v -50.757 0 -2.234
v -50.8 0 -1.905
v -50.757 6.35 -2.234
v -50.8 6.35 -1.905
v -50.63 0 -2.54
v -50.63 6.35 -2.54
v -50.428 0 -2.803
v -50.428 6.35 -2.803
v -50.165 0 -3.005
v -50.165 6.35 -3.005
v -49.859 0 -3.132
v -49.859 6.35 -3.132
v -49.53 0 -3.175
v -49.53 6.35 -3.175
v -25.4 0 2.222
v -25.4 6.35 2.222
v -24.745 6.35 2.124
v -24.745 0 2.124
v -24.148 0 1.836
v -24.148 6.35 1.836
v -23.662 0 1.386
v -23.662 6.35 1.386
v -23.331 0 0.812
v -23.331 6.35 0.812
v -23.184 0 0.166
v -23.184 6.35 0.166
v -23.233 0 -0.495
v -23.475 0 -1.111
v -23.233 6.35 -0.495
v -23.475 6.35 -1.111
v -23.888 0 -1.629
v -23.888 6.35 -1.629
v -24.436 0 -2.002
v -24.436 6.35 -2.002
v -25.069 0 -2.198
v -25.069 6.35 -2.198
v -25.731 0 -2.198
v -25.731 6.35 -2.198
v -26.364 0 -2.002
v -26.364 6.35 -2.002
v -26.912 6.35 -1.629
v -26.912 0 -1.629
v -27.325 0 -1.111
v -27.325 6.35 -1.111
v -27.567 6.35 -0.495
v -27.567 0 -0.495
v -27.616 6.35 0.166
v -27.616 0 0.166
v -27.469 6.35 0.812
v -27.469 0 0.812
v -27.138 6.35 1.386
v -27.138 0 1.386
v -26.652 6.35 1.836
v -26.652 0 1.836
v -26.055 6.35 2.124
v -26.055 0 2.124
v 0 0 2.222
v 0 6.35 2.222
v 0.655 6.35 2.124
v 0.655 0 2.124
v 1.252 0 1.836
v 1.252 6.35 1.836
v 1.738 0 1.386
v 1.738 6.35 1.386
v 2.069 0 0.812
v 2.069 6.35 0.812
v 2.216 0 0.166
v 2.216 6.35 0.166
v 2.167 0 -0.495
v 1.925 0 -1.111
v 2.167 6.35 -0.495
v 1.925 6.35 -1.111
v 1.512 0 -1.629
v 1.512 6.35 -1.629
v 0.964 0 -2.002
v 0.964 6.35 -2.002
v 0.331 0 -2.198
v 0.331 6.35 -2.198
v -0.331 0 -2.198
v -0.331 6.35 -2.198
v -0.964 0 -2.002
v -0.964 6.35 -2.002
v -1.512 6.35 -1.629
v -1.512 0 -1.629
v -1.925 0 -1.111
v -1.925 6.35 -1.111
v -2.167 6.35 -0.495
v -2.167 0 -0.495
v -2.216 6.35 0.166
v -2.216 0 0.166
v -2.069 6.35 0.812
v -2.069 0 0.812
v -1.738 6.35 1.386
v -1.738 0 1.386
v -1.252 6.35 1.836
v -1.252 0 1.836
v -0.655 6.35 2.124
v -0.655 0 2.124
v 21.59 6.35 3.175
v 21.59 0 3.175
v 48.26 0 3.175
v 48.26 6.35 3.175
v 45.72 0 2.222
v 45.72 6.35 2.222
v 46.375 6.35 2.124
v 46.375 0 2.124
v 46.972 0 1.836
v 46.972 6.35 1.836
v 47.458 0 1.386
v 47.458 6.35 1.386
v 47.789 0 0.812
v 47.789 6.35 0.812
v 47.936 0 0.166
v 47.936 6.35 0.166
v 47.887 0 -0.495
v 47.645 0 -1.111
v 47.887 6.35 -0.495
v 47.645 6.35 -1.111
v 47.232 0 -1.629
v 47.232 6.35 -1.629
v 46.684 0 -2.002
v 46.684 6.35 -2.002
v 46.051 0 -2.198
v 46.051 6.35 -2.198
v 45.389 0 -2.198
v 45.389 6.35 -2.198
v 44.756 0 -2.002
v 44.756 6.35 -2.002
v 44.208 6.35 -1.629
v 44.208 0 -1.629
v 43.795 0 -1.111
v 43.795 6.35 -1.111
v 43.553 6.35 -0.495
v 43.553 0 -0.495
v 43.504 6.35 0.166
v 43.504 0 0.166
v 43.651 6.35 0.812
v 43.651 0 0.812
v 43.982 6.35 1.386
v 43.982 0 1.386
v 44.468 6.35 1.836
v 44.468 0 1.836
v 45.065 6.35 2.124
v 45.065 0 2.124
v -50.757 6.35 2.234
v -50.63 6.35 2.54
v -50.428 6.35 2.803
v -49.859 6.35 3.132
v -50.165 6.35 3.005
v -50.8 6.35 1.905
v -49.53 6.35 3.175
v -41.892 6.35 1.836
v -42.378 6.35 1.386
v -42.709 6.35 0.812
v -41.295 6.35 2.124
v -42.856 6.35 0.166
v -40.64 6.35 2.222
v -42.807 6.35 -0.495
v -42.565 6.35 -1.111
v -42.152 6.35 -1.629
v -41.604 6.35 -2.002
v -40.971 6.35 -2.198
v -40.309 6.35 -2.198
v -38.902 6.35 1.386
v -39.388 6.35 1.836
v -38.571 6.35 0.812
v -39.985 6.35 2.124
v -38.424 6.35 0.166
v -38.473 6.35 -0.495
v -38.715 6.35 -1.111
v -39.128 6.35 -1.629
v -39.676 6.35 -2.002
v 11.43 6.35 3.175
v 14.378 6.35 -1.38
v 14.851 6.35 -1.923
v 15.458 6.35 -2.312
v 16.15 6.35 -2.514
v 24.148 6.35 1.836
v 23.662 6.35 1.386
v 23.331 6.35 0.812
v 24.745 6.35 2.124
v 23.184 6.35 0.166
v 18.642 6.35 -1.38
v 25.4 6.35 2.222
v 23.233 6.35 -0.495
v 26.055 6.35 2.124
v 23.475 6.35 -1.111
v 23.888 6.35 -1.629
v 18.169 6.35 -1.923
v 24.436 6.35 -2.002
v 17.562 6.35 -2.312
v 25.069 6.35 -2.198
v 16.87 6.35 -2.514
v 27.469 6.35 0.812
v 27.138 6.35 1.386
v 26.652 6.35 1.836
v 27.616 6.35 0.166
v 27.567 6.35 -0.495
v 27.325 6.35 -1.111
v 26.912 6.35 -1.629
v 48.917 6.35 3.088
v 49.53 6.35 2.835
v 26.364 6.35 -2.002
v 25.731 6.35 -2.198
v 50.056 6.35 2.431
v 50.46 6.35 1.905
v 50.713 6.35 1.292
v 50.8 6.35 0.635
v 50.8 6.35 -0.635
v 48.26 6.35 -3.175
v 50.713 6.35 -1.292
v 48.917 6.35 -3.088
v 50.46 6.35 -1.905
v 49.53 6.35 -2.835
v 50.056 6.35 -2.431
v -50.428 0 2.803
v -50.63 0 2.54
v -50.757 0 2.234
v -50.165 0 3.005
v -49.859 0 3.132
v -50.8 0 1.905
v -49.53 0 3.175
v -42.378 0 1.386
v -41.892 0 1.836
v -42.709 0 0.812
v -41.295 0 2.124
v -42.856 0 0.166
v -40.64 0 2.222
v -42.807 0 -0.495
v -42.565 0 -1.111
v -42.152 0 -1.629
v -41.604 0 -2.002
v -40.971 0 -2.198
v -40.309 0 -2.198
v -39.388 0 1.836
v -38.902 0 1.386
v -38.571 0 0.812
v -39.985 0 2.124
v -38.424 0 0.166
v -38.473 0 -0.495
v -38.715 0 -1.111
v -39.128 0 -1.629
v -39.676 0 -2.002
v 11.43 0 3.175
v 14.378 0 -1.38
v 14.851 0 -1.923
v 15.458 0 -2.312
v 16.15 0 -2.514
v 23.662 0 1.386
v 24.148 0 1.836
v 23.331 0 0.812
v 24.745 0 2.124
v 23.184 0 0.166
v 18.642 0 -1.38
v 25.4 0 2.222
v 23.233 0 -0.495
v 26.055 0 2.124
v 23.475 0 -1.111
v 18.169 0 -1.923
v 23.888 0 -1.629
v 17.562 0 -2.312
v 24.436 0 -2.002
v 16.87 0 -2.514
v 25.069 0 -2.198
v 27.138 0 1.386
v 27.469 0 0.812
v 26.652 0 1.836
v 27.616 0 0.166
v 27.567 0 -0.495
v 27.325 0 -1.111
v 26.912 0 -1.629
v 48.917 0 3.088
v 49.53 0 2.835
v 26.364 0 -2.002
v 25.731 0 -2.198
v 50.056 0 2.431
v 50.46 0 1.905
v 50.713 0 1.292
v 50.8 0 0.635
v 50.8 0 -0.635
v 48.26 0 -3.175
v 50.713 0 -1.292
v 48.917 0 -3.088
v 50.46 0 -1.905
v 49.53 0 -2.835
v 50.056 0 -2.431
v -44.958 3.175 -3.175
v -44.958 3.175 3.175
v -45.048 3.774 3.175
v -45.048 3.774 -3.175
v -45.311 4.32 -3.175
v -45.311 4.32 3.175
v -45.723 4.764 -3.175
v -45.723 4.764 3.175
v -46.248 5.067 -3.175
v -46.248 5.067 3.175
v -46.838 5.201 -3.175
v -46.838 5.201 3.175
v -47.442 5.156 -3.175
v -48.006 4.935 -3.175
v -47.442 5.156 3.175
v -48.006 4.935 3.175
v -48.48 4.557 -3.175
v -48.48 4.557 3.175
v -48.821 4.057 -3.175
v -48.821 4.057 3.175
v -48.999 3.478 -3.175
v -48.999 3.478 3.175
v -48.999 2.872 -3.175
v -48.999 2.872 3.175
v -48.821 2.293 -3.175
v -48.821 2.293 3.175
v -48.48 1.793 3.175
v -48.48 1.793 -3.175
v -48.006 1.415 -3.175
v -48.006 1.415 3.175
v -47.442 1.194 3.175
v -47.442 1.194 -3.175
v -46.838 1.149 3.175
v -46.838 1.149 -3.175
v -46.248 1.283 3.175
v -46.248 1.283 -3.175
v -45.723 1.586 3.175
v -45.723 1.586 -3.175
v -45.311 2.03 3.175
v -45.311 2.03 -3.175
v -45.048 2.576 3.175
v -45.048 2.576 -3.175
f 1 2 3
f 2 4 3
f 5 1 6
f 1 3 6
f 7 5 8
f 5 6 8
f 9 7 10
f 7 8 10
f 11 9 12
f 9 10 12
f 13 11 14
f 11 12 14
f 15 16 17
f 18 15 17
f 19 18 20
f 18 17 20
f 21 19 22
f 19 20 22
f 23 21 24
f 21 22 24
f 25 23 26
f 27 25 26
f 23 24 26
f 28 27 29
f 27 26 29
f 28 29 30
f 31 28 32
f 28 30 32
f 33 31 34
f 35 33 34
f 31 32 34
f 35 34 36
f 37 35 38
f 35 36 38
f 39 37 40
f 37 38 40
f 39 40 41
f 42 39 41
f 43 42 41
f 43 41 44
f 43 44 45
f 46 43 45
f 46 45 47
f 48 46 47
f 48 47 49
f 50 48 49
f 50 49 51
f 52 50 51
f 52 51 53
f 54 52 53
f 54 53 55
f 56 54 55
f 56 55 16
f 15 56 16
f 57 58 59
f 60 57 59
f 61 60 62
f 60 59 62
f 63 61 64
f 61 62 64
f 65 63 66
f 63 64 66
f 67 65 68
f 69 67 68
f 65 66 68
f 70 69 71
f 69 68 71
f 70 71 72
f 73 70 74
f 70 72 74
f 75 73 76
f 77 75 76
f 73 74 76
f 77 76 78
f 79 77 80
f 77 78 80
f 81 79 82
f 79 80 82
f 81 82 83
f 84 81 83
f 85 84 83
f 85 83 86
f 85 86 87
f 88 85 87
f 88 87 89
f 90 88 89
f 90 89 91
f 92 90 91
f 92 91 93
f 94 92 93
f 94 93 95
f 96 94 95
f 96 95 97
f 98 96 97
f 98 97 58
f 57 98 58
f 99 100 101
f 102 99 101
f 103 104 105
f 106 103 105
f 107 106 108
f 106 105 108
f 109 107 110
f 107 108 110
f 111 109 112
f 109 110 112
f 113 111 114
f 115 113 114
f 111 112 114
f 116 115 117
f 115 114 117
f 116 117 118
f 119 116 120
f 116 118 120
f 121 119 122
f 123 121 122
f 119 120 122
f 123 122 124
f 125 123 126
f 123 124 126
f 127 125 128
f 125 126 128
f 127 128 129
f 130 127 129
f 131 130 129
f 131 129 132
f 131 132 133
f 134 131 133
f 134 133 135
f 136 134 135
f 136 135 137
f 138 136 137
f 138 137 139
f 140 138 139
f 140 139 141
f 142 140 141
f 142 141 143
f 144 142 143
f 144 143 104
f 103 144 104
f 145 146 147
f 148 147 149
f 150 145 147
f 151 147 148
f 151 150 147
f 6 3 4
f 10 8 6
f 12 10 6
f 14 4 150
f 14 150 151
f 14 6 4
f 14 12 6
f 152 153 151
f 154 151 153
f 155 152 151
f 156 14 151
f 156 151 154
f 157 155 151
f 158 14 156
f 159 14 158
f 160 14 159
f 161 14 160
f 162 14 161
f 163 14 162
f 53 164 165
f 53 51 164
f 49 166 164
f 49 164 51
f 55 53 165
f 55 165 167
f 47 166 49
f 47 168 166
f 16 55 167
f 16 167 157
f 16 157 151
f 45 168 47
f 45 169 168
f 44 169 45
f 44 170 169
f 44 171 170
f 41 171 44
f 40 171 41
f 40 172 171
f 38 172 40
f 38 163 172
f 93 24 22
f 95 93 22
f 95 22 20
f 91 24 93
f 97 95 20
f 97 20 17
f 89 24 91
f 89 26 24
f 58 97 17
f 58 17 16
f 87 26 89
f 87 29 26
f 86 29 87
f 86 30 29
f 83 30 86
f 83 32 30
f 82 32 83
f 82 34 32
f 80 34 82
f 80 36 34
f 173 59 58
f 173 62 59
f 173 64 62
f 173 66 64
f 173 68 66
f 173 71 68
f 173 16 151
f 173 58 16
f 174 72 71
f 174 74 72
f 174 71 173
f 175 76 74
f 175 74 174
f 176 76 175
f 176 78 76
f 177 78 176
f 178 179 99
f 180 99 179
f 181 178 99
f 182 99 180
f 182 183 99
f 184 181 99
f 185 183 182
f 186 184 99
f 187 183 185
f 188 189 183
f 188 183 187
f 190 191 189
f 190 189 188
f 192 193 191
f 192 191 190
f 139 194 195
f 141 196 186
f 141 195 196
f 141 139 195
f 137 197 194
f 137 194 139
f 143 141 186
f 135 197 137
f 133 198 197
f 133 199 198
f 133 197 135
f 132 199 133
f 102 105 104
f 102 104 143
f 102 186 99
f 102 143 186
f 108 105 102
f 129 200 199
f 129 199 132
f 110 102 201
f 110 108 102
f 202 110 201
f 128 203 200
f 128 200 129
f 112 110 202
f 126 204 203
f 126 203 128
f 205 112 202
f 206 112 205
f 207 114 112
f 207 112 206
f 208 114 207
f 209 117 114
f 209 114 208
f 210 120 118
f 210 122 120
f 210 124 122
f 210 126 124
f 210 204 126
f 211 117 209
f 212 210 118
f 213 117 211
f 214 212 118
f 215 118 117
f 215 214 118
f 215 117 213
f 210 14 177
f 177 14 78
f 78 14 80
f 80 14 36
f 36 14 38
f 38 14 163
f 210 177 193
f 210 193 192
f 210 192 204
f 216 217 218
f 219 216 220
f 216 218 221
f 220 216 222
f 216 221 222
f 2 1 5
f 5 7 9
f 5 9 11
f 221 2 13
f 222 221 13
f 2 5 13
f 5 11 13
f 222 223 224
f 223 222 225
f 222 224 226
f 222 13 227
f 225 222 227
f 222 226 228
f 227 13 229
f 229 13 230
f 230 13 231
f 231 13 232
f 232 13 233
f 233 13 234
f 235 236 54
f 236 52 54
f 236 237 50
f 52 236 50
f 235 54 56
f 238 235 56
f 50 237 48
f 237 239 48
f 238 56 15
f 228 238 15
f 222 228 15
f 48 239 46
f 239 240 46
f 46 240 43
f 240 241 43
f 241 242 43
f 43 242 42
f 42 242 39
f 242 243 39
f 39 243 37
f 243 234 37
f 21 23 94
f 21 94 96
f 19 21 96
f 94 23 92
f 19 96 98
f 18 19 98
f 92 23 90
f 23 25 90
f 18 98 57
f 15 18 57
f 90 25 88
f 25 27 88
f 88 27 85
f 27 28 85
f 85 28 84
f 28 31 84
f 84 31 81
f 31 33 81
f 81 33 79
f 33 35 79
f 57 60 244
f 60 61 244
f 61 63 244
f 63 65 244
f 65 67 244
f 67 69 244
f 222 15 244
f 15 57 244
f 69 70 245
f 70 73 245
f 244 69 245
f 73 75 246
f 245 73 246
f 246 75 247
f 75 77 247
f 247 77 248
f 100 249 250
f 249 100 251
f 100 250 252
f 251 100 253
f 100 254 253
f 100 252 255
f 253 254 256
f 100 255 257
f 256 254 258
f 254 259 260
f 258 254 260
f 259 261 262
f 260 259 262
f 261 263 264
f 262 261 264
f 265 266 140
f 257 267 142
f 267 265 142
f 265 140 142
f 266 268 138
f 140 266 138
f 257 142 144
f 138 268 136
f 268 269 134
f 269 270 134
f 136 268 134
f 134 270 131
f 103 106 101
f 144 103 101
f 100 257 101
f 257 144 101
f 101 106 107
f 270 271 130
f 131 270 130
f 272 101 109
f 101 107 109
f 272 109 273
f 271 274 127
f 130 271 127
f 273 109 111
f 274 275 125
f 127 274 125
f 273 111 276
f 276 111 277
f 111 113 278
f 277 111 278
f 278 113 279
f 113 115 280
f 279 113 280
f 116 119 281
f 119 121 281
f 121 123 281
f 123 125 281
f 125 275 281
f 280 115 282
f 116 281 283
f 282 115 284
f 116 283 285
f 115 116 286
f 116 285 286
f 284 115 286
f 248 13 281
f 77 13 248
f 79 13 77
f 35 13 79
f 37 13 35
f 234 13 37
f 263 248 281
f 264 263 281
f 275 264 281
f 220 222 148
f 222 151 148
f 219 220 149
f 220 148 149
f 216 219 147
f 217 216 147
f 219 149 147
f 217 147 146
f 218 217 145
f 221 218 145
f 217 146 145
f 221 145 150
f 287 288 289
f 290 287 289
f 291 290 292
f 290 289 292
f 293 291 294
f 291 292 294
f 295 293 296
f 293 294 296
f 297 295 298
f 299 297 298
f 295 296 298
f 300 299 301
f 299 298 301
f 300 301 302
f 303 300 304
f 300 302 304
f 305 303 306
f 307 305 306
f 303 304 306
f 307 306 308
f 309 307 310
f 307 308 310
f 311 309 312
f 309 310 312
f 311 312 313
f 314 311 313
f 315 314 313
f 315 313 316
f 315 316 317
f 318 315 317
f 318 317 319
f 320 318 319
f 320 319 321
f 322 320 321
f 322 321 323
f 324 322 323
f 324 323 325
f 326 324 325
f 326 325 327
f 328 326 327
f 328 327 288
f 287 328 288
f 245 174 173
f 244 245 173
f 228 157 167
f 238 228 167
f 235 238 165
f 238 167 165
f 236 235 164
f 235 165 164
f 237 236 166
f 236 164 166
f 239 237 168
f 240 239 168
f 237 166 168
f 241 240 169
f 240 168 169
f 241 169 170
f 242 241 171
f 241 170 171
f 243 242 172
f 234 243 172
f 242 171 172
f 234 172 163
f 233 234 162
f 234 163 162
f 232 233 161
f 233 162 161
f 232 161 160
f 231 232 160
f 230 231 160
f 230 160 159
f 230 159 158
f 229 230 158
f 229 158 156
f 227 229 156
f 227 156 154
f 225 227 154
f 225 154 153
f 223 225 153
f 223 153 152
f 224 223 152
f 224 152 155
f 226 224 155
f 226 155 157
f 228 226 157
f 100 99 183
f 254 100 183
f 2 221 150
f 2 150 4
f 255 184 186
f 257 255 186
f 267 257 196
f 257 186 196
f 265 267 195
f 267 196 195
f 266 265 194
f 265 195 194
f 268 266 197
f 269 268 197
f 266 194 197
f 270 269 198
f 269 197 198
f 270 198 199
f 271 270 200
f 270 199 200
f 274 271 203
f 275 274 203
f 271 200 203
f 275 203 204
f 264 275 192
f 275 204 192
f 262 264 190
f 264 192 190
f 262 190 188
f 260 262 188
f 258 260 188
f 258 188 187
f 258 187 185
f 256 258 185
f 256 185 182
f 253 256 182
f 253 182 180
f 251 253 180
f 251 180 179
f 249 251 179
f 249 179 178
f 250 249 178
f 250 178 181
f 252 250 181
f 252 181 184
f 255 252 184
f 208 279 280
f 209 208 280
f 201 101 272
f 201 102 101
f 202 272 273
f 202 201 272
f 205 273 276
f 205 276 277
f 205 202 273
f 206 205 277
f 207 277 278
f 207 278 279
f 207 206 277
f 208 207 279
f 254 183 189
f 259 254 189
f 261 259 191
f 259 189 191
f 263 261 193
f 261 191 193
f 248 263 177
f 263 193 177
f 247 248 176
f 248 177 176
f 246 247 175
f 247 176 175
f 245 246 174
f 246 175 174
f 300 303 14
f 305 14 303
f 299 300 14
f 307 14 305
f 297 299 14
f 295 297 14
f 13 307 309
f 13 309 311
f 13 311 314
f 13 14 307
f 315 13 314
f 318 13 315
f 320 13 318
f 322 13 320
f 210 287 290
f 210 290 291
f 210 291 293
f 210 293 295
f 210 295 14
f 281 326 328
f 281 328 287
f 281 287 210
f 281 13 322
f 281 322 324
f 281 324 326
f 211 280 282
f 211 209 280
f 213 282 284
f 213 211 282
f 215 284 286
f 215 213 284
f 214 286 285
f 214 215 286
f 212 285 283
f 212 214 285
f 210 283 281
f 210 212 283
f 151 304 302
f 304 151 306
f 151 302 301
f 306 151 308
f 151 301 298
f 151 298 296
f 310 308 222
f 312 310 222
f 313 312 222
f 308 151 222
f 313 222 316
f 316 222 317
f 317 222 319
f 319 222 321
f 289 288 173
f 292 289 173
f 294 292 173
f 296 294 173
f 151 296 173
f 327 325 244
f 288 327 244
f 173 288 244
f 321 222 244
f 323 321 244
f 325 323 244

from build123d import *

# Parameters (mm, degrees)
SKETCH1_W           = 101.6
SKETCH1_H           = 6.35
BOSS_EXTRUDE1_DEPTH = 6.35
FILLET1_R           = 2.54
FILLET2_R           = 1.27
CUT_EXTRUDE1_REACH  = 53.294
SKETCH2_R           = 2.2225
CUT_EXTRUDE2_REACH  = 53.588
SKETCH3_R           = 2.032
CUT_EXTRUDE3_REACH  = 53.294


with BuildPart() as part:
    # Sketch1 → Boss-Extrude1 (new body)
    with BuildSketch(Plane(origin=(0, 0, 0), x_dir=(1, 0, 0), z_dir=(0, 1, 0))):
        Rectangle(SKETCH1_W, SKETCH1_H)
    extrude(amount=BOSS_EXTRUDE1_DEPTH)

    # Fillet1
    fillet1_edges = [part.edges().sort_by_distance(p)[0] for p in [
        (50.8, 3.175, 3.175),
        (50.8, 3.175, -3.175),
    ]]
    fillet(fillet1_edges, radius=FILLET1_R)

    # Fillet2
    fillet2_edges = [part.edges().sort_by_distance(p)[0] for p in [
        (-50.8, 3.175, 3.175),
        (-50.8, 3.175, -3.175),
    ]]
    fillet(fillet2_edges, radius=FILLET2_R)

    # Sketch2 → Cut-Extrude1 (cut, up to next)
    with BuildSketch(Plane(origin=(0, 6.35, 0), x_dir=(1, 0, 0), z_dir=(0, 1, 0)), mode=Mode.PRIVATE) as cut_extrude1_sk1:
        with Locations(Location((-40.64, 0, 0), (0, 0, 270))):
            Circle(SKETCH2_R)
    cut_extrude1_tool1 = extrude(cut_extrude1_sk1.sketch, amount=-CUT_EXTRUDE1_REACH, mode=Mode.PRIVATE) & part.part
    # Sketch2 → Cut-Extrude1 (cut, up to next)
    with BuildSketch(Plane(origin=(0, 6.35, 0), x_dir=(1, 0, 0), z_dir=(0, 1, 0)), mode=Mode.PRIVATE) as cut_extrude1_sk2:
        with Locations(Location((45.72, 0, 0), (0, 0, 270))):
            Circle(SKETCH2_R)
    cut_extrude1_tool2 = extrude(cut_extrude1_sk2.sketch, amount=-CUT_EXTRUDE1_REACH, mode=Mode.PRIVATE) & part.part
    # Sketch2 → Cut-Extrude1 (cut, up to next)
    with BuildSketch(Plane(origin=(0, 6.35, 0), x_dir=(1, 0, 0), z_dir=(0, 1, 0)), mode=Mode.PRIVATE) as cut_extrude1_sk3:
        with Locations(Location((25.4, 0, 0), (0, 0, 270))):
            Circle(SKETCH2_R)
    cut_extrude1_tool3 = extrude(cut_extrude1_sk3.sketch, amount=-CUT_EXTRUDE1_REACH, mode=Mode.PRIVATE) & part.part
    # Sketch2 → Cut-Extrude1 (cut, up to next)
    with BuildSketch(Plane(origin=(0, 6.35, 0), x_dir=(1, 0, 0), z_dir=(0, 1, 0)), mode=Mode.PRIVATE) as cut_extrude1_sk4:
        with Locations(Location((-25.4, 0, 0), (0, 0, 270))):
            Circle(SKETCH2_R)
    cut_extrude1_tool4 = extrude(cut_extrude1_sk4.sketch, amount=-CUT_EXTRUDE1_REACH, mode=Mode.PRIVATE) & part.part
    # Sketch2 → Cut-Extrude1 (cut, up to next)
    with BuildSketch(Plane(origin=(0, 6.35, 0), x_dir=(1, 0, 0), z_dir=(0, 1, 0)), mode=Mode.PRIVATE) as cut_extrude1_sk5:
        with Locations(Location((0, 0, 0), (0, 0, 270))):
            Circle(SKETCH2_R)
    cut_extrude1_tool5 = extrude(cut_extrude1_sk5.sketch, amount=-CUT_EXTRUDE1_REACH, mode=Mode.PRIVATE) & part.part
    add(cut_extrude1_tool1.solids().sort_by_distance((-40.64, 6.35, 0))[0], mode=Mode.SUBTRACT)
    add(cut_extrude1_tool2.solids().sort_by_distance((45.72, 6.35, 0))[0], mode=Mode.SUBTRACT)
    add(cut_extrude1_tool3.solids().sort_by_distance((25.4, 6.35, 0))[0], mode=Mode.SUBTRACT)
    add(cut_extrude1_tool4.solids().sort_by_distance((-25.4, 6.35, 0))[0], mode=Mode.SUBTRACT)
    add(cut_extrude1_tool5.solids().sort_by_distance((0, 6.35, 0))[0], mode=Mode.SUBTRACT)

    # Sketch3 → Cut-Extrude2 (cut, up to next)
    with BuildSketch(Plane.XY.offset(3.175), mode=Mode.PRIVATE) as cut_extrude2_sk1:
        with Locations((-46.99, 3.175)):
            Circle(SKETCH3_R)
    cut_extrude2_tool1 = extrude(cut_extrude2_sk1.sketch, amount=-CUT_EXTRUDE2_REACH, mode=Mode.PRIVATE) & part.part
    add(cut_extrude2_tool1.solids().sort_by_distance((-46.99, 3.175, 3.175))[0], mode=Mode.SUBTRACT)

    # Sketch4 → Cut-Extrude3 (cut, up to next)
    with BuildSketch(Plane(origin=(0, 6.35, 0), x_dir=(1, 0, 0), z_dir=(0, 1, 0)), mode=Mode.PRIVATE) as cut_extrude3_sk1:
        with BuildLine():
            Line((21.59, -3.175), (18.642458961, 1.379934338))
            ThreePointArc((18.642458961, 1.379934338), (16.51, 2.54), (14.377541039, 1.379934338))
            Line((14.377541039, 1.379934338), (11.43, -3.175))
            Line((11.43, -3.175), (21.59, -3.175))
        make_face()
    cut_extrude3_tool1 = extrude(cut_extrude3_sk1.sketch, amount=-CUT_EXTRUDE3_REACH, mode=Mode.PRIVATE) & part.part
    add(cut_extrude3_tool1.solids().sort_by_distance((16.51, 6.35, 0.914009))[0], mode=Mode.SUBTRACT)


solid = part.part
